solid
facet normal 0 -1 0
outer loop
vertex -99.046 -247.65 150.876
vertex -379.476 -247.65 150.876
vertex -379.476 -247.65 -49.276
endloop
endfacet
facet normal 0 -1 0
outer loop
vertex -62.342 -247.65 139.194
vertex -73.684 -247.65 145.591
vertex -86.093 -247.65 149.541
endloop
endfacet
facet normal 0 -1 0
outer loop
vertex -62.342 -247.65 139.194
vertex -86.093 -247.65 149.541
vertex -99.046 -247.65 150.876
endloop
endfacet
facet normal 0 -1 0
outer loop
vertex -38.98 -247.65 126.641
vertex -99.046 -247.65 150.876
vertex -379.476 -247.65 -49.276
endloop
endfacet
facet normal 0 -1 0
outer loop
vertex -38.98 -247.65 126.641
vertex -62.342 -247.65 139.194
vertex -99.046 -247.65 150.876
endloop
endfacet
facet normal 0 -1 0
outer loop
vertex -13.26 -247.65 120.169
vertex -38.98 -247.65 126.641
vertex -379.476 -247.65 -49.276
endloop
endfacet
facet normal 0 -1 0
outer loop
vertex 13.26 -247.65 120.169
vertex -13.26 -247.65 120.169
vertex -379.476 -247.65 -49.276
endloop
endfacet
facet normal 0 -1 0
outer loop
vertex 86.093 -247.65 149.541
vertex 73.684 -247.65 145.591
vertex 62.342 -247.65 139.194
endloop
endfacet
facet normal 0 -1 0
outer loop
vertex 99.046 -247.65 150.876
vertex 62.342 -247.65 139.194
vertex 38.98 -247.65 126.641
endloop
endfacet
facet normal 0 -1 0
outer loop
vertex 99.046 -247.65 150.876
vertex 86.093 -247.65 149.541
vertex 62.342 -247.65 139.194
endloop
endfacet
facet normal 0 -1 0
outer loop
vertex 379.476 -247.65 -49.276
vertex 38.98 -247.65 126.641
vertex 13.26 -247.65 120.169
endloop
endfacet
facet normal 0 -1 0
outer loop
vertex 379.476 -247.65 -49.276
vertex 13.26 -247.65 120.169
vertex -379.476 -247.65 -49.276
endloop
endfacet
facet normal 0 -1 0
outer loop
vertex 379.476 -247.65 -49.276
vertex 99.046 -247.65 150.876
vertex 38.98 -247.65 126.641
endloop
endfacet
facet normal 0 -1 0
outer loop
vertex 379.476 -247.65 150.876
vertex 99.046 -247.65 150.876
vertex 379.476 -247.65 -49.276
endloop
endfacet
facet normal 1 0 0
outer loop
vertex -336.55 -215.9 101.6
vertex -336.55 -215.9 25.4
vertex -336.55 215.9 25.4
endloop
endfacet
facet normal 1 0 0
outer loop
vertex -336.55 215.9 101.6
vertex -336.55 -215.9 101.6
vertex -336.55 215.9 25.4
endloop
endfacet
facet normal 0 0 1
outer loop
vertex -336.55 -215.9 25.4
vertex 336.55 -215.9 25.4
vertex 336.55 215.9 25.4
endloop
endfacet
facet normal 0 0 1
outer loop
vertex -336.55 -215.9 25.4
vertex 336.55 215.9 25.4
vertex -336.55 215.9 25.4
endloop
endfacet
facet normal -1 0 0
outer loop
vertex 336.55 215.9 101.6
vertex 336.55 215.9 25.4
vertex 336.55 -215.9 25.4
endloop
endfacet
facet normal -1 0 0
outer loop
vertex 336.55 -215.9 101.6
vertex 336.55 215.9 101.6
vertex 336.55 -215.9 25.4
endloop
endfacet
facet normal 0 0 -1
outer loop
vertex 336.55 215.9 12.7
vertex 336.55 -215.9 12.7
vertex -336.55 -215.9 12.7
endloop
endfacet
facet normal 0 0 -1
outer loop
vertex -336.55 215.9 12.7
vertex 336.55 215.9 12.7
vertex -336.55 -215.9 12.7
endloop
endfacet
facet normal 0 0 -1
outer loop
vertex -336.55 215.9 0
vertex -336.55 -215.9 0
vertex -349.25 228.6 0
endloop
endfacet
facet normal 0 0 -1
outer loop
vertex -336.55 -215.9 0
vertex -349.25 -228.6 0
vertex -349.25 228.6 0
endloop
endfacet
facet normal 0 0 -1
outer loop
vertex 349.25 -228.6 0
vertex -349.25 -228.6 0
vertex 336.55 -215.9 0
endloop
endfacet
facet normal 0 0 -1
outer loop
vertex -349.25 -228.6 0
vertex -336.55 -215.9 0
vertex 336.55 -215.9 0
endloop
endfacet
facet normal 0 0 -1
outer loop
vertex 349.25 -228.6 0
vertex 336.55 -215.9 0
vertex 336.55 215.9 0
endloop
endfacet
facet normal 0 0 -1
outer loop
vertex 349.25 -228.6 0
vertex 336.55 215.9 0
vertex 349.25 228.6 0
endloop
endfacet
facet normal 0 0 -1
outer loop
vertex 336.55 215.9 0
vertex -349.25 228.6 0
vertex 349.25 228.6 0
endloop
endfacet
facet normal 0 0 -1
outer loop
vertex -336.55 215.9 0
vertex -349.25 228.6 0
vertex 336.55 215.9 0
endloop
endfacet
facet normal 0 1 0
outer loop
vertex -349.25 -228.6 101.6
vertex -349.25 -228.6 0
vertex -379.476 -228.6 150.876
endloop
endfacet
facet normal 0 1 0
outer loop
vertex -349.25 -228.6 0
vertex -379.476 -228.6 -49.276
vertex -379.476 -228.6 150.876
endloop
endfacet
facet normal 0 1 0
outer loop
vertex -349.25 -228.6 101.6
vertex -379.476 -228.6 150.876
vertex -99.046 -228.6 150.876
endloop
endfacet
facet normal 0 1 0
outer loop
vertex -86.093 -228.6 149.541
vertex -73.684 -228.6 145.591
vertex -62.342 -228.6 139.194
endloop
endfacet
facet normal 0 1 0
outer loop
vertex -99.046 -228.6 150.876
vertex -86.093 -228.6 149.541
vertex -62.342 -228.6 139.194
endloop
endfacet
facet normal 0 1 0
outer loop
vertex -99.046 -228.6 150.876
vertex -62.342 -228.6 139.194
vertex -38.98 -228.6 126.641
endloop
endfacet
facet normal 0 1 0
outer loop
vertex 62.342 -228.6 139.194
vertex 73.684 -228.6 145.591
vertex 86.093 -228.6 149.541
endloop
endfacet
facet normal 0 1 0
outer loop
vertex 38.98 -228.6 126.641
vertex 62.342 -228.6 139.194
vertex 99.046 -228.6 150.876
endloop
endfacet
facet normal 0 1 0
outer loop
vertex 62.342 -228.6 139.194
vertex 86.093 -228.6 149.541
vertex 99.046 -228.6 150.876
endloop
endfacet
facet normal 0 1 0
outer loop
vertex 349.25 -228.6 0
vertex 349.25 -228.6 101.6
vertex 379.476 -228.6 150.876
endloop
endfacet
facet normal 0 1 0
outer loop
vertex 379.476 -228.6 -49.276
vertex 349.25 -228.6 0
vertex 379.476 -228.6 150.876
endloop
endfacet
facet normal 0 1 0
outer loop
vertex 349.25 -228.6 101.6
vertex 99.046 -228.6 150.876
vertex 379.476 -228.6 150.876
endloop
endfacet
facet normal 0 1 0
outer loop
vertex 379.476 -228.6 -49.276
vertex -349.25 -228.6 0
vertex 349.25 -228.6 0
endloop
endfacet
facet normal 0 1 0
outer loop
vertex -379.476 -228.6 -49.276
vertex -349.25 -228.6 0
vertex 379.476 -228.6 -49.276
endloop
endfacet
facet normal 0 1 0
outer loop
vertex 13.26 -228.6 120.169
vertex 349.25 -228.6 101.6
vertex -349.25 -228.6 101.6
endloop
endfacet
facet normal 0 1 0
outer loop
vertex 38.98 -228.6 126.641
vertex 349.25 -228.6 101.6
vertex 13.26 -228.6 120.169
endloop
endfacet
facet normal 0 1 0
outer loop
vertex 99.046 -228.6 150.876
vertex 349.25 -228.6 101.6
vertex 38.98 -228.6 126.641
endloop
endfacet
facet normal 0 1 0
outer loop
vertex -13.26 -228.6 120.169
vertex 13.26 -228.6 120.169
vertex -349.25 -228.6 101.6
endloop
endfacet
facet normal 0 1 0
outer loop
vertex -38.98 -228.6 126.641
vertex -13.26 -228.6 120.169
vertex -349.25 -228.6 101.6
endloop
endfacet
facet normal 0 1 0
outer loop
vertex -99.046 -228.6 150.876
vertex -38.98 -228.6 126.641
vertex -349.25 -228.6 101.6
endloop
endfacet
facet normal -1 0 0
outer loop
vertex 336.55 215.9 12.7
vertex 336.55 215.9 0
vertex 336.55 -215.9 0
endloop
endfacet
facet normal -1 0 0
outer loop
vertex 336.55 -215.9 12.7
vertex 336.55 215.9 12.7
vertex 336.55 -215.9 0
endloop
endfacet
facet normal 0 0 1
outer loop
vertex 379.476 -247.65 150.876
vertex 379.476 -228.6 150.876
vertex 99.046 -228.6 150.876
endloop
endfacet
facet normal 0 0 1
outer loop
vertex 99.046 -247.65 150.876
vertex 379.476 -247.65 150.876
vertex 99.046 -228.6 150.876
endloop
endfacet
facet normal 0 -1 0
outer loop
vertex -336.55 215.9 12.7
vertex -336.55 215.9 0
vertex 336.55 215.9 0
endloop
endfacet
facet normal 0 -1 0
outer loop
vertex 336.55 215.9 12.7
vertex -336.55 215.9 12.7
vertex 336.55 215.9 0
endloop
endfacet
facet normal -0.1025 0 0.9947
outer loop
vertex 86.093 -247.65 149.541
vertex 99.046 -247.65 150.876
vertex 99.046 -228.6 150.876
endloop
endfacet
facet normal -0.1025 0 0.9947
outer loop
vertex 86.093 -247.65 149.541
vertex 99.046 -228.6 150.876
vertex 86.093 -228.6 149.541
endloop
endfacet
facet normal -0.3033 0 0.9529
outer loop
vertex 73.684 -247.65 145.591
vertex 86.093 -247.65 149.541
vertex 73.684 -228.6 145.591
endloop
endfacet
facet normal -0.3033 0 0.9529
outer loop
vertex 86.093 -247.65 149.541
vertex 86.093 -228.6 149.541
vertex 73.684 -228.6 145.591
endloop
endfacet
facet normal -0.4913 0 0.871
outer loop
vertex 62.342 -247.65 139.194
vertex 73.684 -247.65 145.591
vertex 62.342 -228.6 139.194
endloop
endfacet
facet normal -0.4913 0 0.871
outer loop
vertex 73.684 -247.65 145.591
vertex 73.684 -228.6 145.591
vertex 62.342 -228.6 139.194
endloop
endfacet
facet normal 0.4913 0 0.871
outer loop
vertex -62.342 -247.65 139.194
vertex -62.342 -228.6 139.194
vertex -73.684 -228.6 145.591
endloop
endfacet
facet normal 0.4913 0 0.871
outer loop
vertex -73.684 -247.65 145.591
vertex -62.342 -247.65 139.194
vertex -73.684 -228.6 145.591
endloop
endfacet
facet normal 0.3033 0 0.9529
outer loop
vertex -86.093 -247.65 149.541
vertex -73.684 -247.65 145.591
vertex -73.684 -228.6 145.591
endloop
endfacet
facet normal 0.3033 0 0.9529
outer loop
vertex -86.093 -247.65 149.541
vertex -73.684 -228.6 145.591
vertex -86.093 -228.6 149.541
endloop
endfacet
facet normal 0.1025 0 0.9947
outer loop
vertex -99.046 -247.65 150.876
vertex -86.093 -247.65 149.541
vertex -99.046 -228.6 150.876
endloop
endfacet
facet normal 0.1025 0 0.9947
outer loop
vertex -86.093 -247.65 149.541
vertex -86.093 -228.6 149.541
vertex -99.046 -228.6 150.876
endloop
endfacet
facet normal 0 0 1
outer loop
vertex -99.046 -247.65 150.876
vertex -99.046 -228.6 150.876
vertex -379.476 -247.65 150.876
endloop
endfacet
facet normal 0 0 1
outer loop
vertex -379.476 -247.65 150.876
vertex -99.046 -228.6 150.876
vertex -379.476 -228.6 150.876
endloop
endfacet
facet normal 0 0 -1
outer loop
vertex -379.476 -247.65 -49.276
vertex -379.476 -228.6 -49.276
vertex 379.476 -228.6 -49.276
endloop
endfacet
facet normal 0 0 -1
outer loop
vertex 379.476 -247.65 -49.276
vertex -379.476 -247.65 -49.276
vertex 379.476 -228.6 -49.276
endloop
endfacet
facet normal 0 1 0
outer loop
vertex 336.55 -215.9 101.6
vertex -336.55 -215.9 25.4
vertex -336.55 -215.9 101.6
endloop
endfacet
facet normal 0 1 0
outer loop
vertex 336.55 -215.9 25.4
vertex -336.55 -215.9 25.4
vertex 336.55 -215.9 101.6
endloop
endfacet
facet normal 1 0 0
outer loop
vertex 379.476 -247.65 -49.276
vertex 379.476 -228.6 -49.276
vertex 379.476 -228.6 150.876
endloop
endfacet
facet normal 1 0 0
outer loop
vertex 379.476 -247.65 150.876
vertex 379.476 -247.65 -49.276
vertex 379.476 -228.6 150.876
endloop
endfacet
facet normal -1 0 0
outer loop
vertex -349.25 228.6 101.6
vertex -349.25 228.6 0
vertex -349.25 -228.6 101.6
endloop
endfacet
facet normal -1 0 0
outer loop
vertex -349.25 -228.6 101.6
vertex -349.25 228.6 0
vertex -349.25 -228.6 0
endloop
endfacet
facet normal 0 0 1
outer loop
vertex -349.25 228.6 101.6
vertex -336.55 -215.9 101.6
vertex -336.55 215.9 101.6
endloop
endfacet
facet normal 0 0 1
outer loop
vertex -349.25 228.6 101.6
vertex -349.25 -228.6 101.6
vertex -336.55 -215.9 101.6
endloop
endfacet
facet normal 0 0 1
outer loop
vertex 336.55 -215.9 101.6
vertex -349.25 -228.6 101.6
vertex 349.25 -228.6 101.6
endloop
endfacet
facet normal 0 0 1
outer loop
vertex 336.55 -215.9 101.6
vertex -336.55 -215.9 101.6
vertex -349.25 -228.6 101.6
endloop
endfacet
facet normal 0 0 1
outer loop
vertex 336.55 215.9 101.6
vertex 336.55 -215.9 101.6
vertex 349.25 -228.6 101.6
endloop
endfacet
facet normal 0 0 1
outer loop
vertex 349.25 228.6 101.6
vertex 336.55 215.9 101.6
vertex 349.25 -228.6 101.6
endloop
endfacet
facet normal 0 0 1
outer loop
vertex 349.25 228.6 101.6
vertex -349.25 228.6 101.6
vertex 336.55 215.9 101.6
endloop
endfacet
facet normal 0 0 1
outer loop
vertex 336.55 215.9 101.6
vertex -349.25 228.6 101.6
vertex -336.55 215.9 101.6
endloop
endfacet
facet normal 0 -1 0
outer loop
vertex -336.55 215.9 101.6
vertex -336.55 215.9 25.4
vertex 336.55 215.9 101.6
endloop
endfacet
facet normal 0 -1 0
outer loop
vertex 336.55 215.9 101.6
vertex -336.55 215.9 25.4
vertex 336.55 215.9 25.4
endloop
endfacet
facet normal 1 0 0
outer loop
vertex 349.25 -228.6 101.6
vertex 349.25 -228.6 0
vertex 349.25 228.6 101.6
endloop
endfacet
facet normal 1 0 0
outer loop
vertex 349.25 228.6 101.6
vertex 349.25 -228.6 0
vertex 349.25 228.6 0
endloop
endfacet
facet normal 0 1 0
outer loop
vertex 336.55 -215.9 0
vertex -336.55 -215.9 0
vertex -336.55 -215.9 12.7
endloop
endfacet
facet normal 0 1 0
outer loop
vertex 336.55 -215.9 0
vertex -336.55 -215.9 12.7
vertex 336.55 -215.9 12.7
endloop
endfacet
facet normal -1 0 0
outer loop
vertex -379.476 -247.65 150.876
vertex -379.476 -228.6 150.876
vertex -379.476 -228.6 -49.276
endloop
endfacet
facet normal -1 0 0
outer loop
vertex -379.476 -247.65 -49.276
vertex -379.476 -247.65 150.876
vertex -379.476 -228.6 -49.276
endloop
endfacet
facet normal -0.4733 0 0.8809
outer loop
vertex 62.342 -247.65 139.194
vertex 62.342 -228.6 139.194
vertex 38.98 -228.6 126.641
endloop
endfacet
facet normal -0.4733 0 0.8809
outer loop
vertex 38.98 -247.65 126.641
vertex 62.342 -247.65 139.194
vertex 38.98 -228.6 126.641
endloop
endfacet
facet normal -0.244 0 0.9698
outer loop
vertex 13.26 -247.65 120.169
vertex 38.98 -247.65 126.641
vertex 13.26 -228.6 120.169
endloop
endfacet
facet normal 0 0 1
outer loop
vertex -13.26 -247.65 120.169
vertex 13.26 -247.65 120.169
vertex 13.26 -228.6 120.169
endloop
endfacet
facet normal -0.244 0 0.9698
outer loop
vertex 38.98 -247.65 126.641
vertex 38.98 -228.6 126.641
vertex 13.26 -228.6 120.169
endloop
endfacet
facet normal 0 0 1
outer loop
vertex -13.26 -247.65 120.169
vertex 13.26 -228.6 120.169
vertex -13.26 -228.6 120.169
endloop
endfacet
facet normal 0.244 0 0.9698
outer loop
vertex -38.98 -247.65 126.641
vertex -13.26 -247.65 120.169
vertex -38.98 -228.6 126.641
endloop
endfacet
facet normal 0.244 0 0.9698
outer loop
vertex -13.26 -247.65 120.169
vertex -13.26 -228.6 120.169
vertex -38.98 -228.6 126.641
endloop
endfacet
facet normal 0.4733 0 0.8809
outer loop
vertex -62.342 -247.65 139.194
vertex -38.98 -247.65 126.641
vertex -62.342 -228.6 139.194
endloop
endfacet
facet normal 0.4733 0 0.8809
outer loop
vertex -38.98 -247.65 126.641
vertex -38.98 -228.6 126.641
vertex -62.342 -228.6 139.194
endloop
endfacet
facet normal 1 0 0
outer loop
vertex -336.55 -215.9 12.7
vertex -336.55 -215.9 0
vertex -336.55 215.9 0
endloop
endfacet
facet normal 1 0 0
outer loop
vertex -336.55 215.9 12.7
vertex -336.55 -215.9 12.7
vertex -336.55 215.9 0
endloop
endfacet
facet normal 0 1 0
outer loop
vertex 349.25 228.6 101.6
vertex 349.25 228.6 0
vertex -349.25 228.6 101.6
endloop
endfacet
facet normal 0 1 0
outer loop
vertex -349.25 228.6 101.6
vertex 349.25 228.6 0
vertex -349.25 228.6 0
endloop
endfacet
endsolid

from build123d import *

# Parameters (mm, degrees)
F0_W     = 673.1
F0_H     = 12.7
F1_DEPTH = 101.6
F3_E11_W = 673.1
F3_E11_H = 431.8
F4_DEPTH = 12.7
F5_W     = 698.5
F5_H     = 101.6
F6_DEPTH = 19.05


with BuildPart() as f1:
    # F0 (on Top) → F1 (new body)
    with BuildSketch(Plane.XY):
        Polygon((336.55, 215.9), (349.25, 228.6), (-349.25, 228.6), (-336.55, 215.9), align=None)
        Polygon((349.25, -228.6), (349.25, 228.6), (336.55, 215.9), (336.55, -215.9), (336.55, -228.6), align=None)
        Polygon((-336.55, 215.9), (-349.25, 228.6), (-349.25, -228.6), (-336.55, -228.6), (-336.55, -215.9), align=None)
        with Locations((0, -222.25)):
            Rectangle(F0_W, F0_H)
    extrude(amount=F1_DEPTH)

    # F3_E11 (on explicit) → F4 (join)
    with BuildSketch(Plane(origin=(336.55, 215.9, 12.7), x_dir=(-1, 0, 0), z_dir=(0, 0, 1))):
        with Locations((336.55, 215.9)):
            Rectangle(F3_E11_W, F3_E11_H)
    extrude(amount=F4_DEPTH)

    # F5 (on face) → F6 (join)
    with BuildSketch(Plane.XZ.offset(228.6)):
        with BuildLine():
            Line((-379.476, -49.276), (379.476, -49.276))
            Line((379.476, -49.276), (379.476, 150.876))
            Line((379.476, 150.876), (99.0458770515, 150.876))
            ThreePointArc((99.0458770515, 150.876), (79.7868016321, 147.884991183), (62.3420274532, 139.1937327241))
            ThreePointArc((62.3420274532, 139.1937327241), (0, 119.3512302291), (-62.3420274532, 139.1937327241))
            ThreePointArc((-62.3420274532, 139.1937327241), (-79.7868016321, 147.884991183), (-99.0458770515, 150.876))
            Line((-99.0458770515, 150.876), (-379.476, 150.876))
            Line((-379.476, 150.876), (-379.476, -49.276))
        make_face()
        with Locations((0, 50.8)):
            Rectangle(F5_W, F5_H, mode=Mode.SUBTRACT)
        with Locations((0, 50.8)):
            Rectangle(F5_W, F5_H)
    extrude(amount=F6_DEPTH)


solid = f1.part
